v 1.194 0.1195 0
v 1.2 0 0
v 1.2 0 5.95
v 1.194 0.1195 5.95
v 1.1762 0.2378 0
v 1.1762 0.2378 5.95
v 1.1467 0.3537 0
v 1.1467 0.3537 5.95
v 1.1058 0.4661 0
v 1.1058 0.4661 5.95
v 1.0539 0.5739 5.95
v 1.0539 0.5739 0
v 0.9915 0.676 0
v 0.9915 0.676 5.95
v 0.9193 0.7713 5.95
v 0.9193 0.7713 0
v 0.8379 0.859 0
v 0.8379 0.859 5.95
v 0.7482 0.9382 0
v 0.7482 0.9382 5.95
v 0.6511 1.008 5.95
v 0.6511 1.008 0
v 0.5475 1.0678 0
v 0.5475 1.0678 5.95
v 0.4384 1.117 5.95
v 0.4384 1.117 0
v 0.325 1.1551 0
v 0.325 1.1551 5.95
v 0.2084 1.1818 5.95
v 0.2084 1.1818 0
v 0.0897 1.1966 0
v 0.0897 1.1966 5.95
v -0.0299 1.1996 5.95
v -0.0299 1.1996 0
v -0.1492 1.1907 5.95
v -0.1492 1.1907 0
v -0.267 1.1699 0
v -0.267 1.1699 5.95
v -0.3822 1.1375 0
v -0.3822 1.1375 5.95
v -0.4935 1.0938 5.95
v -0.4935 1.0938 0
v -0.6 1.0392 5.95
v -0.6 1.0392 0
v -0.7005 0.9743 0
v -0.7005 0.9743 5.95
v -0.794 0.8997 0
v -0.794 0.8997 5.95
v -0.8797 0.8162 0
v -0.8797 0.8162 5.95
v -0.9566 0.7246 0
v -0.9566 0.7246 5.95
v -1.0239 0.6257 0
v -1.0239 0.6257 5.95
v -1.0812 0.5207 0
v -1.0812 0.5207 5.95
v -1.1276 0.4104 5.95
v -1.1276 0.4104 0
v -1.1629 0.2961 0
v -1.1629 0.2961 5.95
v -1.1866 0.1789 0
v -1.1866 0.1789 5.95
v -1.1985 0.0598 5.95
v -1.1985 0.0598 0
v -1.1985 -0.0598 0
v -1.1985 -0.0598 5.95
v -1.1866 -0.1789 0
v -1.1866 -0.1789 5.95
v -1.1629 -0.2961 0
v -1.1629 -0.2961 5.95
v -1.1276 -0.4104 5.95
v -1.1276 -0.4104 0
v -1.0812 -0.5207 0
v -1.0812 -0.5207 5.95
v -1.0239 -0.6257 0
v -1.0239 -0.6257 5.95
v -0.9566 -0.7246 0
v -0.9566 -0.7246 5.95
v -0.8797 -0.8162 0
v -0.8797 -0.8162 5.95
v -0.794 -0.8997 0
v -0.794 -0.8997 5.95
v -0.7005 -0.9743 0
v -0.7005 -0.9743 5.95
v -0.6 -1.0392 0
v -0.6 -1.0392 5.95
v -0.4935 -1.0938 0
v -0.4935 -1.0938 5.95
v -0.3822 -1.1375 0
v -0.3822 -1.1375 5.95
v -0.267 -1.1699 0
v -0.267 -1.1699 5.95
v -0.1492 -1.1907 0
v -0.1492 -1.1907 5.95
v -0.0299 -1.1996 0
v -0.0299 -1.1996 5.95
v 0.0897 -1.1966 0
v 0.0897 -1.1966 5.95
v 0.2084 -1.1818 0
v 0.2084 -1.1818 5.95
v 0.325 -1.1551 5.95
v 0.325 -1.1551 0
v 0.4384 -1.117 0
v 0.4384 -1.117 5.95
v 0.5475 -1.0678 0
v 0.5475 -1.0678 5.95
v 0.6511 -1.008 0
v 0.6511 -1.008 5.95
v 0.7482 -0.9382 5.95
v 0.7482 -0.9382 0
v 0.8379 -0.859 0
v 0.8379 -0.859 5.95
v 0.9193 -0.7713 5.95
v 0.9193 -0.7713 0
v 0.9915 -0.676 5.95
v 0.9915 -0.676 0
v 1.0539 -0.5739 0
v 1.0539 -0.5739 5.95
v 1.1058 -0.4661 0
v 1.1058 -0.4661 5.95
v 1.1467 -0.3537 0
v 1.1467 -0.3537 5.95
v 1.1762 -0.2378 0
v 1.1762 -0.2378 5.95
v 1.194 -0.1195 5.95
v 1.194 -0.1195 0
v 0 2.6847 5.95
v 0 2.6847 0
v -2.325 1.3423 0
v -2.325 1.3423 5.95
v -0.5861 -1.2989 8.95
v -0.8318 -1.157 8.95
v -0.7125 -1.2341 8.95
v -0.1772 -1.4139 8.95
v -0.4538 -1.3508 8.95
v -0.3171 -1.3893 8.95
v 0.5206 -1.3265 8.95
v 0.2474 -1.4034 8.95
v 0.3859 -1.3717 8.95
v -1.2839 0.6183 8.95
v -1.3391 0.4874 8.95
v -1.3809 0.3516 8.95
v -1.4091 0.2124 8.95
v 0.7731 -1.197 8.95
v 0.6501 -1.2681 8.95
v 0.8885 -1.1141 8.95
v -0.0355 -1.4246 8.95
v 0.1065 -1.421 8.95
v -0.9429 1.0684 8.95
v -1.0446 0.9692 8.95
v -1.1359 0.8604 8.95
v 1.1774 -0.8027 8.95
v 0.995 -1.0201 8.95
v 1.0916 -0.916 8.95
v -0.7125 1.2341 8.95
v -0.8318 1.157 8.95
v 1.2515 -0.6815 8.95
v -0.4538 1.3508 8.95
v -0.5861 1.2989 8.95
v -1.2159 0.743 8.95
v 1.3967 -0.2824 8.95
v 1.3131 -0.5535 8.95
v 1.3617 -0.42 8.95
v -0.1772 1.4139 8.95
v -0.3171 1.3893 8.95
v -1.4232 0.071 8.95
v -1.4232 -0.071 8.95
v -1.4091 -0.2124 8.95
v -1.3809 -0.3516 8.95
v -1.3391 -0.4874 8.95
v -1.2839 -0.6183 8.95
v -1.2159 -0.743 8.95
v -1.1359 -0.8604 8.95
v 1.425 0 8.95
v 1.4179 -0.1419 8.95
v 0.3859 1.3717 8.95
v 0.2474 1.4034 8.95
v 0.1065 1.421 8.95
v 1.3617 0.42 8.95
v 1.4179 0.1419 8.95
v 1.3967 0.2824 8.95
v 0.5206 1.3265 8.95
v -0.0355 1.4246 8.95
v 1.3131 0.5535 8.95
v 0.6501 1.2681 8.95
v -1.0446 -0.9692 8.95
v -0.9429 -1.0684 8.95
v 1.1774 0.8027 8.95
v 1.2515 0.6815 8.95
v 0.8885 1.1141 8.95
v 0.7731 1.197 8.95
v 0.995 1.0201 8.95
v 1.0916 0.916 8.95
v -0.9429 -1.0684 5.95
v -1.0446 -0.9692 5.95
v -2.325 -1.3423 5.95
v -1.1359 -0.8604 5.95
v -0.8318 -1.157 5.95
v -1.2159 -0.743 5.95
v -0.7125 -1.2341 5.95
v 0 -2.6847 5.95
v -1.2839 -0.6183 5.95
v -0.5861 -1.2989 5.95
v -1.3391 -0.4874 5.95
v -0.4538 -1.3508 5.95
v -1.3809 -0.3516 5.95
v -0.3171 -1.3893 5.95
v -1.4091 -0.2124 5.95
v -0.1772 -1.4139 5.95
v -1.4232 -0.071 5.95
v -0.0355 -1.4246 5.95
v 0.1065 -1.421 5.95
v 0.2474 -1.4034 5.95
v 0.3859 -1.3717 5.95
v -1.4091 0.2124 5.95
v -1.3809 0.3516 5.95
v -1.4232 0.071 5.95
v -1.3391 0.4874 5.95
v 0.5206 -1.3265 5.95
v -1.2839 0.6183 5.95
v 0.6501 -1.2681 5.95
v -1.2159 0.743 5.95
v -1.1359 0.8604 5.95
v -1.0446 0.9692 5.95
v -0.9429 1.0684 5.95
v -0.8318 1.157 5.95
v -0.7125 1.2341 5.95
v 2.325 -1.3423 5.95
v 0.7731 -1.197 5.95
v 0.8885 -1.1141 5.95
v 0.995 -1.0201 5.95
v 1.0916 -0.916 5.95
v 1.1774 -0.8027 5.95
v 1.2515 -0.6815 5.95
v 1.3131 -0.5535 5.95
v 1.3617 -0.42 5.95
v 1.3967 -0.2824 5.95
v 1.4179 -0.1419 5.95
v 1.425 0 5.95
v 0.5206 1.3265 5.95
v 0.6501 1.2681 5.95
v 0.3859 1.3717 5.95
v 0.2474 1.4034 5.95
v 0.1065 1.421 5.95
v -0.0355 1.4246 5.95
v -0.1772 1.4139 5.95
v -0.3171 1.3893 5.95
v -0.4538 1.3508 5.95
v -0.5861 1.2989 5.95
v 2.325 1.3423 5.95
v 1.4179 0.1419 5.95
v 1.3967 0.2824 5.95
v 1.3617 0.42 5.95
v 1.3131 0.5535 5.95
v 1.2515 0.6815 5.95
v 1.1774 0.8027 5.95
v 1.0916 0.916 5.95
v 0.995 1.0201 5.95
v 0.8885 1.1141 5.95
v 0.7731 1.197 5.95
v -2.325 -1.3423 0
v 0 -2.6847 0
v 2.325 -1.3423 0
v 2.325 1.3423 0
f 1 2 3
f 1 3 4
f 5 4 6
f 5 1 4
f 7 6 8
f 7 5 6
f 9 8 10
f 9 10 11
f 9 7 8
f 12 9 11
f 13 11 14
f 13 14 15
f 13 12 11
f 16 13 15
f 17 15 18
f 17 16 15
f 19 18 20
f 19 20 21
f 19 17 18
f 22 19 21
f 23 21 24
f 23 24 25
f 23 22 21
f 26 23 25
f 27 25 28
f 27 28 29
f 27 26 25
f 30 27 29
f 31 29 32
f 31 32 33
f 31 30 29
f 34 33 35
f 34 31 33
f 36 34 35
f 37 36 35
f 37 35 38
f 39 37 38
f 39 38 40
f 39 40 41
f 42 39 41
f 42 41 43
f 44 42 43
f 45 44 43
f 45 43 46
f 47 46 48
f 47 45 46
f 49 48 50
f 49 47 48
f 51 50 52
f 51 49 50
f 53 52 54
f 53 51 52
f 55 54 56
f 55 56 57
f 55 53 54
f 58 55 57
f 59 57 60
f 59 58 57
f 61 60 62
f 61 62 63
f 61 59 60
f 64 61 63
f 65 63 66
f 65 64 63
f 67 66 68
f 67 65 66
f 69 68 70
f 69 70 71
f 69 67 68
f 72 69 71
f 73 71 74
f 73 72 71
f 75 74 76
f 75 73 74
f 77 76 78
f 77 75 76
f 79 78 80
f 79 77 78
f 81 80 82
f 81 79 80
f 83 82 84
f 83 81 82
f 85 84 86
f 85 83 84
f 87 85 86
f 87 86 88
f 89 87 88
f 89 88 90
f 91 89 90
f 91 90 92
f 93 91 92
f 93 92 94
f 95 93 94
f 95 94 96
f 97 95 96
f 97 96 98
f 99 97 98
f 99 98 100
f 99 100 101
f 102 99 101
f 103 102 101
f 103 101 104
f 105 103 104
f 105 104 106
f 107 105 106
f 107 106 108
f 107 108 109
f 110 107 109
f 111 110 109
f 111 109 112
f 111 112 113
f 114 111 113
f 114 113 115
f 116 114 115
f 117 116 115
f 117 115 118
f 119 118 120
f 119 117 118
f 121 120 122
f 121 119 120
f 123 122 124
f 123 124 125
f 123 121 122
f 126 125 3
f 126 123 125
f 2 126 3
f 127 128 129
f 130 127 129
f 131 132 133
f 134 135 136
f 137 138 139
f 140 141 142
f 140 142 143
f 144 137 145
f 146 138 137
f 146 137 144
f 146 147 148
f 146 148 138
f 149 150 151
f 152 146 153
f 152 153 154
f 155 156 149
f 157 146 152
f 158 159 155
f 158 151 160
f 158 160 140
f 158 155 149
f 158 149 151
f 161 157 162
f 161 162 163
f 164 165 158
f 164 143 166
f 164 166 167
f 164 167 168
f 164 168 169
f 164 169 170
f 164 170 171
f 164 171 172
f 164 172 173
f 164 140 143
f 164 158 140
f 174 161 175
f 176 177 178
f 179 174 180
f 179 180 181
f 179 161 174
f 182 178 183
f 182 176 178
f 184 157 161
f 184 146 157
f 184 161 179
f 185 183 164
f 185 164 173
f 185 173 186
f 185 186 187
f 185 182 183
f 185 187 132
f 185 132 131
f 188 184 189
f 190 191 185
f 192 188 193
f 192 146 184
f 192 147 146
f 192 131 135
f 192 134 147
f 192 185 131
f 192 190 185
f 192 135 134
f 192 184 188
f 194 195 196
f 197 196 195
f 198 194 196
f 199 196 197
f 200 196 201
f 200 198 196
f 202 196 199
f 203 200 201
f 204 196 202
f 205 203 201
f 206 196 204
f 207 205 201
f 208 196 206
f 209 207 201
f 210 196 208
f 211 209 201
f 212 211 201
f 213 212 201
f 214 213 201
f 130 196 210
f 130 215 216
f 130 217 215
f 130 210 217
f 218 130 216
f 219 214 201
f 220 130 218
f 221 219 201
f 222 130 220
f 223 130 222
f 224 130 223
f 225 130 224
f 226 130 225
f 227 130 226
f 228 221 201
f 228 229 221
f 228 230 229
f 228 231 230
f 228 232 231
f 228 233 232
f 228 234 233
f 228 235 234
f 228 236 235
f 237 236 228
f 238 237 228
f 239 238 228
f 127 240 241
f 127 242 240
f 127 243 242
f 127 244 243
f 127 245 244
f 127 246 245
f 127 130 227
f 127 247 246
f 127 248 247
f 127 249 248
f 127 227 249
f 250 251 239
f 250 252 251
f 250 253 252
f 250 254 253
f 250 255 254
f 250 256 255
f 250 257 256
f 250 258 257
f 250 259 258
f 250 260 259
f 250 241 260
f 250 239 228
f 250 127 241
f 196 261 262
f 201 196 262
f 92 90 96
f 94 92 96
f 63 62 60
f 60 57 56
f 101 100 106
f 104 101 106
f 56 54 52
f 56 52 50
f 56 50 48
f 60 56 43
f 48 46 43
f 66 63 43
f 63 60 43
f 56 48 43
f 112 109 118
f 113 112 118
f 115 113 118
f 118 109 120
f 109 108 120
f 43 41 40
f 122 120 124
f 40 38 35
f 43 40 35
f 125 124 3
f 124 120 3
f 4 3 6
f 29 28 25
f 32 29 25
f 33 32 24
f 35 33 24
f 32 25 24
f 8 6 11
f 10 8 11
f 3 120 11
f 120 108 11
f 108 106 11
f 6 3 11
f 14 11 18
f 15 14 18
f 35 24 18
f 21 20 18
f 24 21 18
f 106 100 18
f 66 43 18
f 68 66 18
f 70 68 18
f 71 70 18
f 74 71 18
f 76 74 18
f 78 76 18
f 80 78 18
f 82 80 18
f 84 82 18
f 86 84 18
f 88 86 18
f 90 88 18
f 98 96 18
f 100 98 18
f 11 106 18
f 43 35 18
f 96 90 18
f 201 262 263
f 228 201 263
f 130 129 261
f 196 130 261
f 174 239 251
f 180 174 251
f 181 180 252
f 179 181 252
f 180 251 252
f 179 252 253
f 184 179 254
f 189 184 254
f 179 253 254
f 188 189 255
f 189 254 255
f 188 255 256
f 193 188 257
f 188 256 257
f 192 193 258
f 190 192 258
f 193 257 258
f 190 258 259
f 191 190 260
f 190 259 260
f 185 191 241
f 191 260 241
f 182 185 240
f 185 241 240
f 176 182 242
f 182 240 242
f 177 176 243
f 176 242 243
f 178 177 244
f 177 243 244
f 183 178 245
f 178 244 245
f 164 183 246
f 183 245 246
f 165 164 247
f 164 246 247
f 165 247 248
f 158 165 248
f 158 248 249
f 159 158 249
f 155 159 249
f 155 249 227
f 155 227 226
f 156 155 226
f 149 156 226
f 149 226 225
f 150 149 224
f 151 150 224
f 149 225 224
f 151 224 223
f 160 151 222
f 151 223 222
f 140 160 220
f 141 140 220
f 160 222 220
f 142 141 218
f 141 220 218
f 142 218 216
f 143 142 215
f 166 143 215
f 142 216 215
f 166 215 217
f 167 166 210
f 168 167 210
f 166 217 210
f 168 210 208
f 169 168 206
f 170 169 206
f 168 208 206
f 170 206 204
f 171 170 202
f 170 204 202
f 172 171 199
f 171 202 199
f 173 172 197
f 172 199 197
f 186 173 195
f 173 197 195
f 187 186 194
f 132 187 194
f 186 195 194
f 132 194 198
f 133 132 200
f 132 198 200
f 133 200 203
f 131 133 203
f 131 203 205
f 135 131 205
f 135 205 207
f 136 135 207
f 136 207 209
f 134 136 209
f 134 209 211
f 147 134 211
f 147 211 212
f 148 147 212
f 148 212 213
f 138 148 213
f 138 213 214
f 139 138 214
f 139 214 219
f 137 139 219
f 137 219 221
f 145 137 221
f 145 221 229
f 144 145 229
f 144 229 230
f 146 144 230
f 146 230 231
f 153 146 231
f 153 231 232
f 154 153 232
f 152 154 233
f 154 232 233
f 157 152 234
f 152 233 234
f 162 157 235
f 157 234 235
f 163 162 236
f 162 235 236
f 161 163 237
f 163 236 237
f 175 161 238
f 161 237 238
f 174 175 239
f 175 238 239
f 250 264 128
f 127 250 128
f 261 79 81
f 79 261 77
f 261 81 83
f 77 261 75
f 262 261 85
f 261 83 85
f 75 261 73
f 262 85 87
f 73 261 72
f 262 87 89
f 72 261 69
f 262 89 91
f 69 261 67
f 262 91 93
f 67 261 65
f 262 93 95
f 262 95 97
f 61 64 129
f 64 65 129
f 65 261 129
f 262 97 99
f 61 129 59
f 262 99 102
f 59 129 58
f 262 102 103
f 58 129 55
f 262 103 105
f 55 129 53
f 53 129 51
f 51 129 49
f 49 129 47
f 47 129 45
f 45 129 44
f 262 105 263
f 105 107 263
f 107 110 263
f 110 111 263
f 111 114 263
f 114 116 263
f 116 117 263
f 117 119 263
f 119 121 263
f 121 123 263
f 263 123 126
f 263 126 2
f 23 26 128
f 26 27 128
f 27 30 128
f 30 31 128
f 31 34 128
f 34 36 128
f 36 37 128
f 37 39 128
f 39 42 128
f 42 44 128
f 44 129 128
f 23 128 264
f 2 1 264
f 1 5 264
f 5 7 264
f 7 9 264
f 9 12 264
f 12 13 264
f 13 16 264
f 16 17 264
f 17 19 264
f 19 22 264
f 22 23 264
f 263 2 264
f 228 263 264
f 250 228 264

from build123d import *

# Parameters (mm, degrees)
CROQUIS1_R              = 1.2
SALIENTE_EXTRUIR1_DEPTH = 5.95
CROQUIS2_R              = 1.425
SALIENTE_EXTRUIR2_DEPTH = 3


with BuildPart() as part:
    # Croquis1 → Saliente-Extruir1 (new body)
    with BuildSketch(Plane.XY):
        Polygon((0, -2.684678752), (2.325, -1.342339376), (2.325, 1.342339376), (0, 2.684678752), (-2.325, 1.342339376), (-2.325, -1.342339376), align=None)
        Circle(CROQUIS1_R, mode=Mode.SUBTRACT)
    extrude(amount=SALIENTE_EXTRUIR1_DEPTH)

    # Croquis2 → Saliente-Extruir2 (add)
    with BuildSketch(Plane.XY.offset(5.95)):
        Circle(CROQUIS2_R)
    extrude(amount=SALIENTE_EXTRUIR2_DEPTH)


solid = part.part
